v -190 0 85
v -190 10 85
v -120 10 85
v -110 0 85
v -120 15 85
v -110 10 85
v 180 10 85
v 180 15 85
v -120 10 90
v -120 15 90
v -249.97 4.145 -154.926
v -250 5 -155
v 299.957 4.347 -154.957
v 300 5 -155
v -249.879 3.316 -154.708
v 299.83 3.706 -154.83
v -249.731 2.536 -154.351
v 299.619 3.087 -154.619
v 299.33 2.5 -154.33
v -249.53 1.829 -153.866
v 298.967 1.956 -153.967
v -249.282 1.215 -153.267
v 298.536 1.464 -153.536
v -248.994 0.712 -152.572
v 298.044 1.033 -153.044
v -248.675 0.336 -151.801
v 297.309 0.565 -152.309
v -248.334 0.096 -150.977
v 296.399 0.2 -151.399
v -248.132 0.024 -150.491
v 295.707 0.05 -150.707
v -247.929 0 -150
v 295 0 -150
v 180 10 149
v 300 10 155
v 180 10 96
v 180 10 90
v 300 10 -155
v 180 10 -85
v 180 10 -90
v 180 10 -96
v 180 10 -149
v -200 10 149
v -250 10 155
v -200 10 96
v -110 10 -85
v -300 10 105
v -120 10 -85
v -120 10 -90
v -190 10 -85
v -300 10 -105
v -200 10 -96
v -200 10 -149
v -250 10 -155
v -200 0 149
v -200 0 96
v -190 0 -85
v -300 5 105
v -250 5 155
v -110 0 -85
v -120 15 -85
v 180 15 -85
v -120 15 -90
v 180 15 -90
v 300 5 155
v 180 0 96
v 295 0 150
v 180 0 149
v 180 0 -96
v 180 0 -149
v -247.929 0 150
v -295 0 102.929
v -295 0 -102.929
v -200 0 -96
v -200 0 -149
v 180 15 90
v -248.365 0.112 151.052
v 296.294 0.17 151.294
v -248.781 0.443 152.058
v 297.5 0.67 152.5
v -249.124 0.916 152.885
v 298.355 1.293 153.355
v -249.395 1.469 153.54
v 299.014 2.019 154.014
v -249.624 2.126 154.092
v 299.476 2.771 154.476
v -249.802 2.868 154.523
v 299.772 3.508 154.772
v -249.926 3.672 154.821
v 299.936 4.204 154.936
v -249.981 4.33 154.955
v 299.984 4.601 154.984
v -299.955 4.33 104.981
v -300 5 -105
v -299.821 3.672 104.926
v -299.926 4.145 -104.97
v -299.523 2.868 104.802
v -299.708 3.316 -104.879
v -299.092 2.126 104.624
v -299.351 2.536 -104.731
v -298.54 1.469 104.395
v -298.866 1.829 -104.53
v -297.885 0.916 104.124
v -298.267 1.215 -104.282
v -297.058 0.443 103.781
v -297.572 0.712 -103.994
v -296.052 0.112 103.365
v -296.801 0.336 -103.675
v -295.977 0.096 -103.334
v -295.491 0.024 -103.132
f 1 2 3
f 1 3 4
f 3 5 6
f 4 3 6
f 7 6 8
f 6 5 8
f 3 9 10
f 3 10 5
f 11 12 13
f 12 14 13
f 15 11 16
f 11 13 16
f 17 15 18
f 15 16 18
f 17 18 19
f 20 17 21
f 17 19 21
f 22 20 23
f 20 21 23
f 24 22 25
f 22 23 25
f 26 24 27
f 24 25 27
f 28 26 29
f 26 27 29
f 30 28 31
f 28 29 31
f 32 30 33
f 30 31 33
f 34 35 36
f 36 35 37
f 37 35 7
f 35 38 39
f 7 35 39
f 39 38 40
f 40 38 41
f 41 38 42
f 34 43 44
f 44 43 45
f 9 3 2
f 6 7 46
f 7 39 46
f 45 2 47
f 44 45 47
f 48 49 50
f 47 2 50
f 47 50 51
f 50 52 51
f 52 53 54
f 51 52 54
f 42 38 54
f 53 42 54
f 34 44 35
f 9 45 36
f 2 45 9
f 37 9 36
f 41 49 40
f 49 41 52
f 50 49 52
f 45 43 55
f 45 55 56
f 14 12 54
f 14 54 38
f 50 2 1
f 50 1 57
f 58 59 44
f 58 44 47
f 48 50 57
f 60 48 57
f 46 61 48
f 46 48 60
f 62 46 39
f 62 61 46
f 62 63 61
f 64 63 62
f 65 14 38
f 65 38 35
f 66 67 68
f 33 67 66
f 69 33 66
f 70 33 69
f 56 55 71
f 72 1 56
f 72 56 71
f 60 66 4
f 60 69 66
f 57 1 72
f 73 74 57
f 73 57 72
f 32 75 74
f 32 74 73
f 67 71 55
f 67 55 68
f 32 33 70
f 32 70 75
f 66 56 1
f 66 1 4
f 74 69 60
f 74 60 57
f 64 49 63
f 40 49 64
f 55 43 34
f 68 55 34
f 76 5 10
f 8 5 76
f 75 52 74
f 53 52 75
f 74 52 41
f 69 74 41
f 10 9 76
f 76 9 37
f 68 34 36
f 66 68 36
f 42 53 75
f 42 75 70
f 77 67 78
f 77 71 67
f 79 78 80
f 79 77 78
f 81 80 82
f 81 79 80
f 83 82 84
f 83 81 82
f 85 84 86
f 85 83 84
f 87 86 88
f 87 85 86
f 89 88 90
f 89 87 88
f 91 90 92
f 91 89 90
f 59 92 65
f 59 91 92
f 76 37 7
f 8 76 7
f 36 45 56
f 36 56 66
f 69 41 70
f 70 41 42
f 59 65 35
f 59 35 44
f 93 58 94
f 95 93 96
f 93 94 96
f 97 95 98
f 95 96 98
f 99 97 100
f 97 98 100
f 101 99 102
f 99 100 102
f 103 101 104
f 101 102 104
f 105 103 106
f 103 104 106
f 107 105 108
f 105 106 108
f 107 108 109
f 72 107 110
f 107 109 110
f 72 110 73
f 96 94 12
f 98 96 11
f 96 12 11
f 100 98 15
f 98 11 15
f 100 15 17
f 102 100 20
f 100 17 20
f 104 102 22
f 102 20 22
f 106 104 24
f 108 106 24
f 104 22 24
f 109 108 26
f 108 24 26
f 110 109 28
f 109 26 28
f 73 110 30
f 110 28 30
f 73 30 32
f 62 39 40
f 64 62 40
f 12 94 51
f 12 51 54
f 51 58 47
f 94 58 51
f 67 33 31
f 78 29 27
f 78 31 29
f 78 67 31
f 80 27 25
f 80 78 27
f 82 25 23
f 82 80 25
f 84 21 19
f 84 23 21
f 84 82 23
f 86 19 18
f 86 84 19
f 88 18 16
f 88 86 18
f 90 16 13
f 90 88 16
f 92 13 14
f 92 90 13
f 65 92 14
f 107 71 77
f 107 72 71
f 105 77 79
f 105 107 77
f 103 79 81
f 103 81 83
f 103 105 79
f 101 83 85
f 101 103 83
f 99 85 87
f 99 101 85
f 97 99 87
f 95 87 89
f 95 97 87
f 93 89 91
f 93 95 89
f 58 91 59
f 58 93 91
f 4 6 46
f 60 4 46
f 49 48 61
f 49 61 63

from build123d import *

# Parameters (mm, degrees)
BOSS_EXTRUDE2_DEPTH = 10
SKETCH2_W           = 300
SKETCH2_H           = 5
BOSS_EXTRUDE3_DEPTH = 5
FILLET1_R           = 5
SKETCH3_W           = 380
SKETCH3_H           = 53
SKETCH3_W_2         = 80
SKETCH3_H_2         = 170
CUT_EXTRUDE1_DEPTH  = 10


with BuildPart() as part:
    # Sketch1 → Boss-Extrude2 (new body)
    with BuildSketch(Plane(origin=(0, 0, 0), x_dir=(1, 0, 0), z_dir=(0, 1, 0))):
        Polygon((-300, 105), (-250, 155), (300, 155), (300, -155), (-250, -155), (-300, -105), align=None)
    extrude(amount=BOSS_EXTRUDE2_DEPTH)

    # Sketch2 → Boss-Extrude3 (add)
    with BuildSketch(Plane(origin=(0, 10, 0), x_dir=(1, 0, 0), z_dir=(0, 1, 0))):
        with Locations((30, -87.5)):
            Rectangle(SKETCH2_W, SKETCH2_H)
        with Locations((30, 87.5)):
            Rectangle(SKETCH2_W, SKETCH2_H)
    extrude(amount=BOSS_EXTRUDE3_DEPTH)

    # Fillet1
    fillet1_edges = [part.edges().sort_by_distance(p)[0] for p in [
        (25, 0, 155),
        (-275, 0, 130),
        (-300, 0, 0),
        (-275, 0, -130),
        (25, 0, -155),
        (300, 0, 0),
    ]]
    fillet(fillet1_edges, radius=FILLET1_R)

    # Sketch3 → Cut-Extrude1 (cut)
    with BuildSketch(Plane(origin=(0, 10, 0), x_dir=(1, 0, 0), z_dir=(0, 1, 0))):
        with Locations((-10, 122.5)):
            Rectangle(SKETCH3_W, SKETCH3_H)
        with Locations((-10, -122.5)):
            Rectangle(SKETCH3_W, SKETCH3_H)
        with Locations((-150, 0)):
            Rectangle(SKETCH3_W_2, SKETCH3_H_2)
    extrude(amount=-CUT_EXTRUDE1_DEPTH, mode=Mode.SUBTRACT)


solid = part.part
